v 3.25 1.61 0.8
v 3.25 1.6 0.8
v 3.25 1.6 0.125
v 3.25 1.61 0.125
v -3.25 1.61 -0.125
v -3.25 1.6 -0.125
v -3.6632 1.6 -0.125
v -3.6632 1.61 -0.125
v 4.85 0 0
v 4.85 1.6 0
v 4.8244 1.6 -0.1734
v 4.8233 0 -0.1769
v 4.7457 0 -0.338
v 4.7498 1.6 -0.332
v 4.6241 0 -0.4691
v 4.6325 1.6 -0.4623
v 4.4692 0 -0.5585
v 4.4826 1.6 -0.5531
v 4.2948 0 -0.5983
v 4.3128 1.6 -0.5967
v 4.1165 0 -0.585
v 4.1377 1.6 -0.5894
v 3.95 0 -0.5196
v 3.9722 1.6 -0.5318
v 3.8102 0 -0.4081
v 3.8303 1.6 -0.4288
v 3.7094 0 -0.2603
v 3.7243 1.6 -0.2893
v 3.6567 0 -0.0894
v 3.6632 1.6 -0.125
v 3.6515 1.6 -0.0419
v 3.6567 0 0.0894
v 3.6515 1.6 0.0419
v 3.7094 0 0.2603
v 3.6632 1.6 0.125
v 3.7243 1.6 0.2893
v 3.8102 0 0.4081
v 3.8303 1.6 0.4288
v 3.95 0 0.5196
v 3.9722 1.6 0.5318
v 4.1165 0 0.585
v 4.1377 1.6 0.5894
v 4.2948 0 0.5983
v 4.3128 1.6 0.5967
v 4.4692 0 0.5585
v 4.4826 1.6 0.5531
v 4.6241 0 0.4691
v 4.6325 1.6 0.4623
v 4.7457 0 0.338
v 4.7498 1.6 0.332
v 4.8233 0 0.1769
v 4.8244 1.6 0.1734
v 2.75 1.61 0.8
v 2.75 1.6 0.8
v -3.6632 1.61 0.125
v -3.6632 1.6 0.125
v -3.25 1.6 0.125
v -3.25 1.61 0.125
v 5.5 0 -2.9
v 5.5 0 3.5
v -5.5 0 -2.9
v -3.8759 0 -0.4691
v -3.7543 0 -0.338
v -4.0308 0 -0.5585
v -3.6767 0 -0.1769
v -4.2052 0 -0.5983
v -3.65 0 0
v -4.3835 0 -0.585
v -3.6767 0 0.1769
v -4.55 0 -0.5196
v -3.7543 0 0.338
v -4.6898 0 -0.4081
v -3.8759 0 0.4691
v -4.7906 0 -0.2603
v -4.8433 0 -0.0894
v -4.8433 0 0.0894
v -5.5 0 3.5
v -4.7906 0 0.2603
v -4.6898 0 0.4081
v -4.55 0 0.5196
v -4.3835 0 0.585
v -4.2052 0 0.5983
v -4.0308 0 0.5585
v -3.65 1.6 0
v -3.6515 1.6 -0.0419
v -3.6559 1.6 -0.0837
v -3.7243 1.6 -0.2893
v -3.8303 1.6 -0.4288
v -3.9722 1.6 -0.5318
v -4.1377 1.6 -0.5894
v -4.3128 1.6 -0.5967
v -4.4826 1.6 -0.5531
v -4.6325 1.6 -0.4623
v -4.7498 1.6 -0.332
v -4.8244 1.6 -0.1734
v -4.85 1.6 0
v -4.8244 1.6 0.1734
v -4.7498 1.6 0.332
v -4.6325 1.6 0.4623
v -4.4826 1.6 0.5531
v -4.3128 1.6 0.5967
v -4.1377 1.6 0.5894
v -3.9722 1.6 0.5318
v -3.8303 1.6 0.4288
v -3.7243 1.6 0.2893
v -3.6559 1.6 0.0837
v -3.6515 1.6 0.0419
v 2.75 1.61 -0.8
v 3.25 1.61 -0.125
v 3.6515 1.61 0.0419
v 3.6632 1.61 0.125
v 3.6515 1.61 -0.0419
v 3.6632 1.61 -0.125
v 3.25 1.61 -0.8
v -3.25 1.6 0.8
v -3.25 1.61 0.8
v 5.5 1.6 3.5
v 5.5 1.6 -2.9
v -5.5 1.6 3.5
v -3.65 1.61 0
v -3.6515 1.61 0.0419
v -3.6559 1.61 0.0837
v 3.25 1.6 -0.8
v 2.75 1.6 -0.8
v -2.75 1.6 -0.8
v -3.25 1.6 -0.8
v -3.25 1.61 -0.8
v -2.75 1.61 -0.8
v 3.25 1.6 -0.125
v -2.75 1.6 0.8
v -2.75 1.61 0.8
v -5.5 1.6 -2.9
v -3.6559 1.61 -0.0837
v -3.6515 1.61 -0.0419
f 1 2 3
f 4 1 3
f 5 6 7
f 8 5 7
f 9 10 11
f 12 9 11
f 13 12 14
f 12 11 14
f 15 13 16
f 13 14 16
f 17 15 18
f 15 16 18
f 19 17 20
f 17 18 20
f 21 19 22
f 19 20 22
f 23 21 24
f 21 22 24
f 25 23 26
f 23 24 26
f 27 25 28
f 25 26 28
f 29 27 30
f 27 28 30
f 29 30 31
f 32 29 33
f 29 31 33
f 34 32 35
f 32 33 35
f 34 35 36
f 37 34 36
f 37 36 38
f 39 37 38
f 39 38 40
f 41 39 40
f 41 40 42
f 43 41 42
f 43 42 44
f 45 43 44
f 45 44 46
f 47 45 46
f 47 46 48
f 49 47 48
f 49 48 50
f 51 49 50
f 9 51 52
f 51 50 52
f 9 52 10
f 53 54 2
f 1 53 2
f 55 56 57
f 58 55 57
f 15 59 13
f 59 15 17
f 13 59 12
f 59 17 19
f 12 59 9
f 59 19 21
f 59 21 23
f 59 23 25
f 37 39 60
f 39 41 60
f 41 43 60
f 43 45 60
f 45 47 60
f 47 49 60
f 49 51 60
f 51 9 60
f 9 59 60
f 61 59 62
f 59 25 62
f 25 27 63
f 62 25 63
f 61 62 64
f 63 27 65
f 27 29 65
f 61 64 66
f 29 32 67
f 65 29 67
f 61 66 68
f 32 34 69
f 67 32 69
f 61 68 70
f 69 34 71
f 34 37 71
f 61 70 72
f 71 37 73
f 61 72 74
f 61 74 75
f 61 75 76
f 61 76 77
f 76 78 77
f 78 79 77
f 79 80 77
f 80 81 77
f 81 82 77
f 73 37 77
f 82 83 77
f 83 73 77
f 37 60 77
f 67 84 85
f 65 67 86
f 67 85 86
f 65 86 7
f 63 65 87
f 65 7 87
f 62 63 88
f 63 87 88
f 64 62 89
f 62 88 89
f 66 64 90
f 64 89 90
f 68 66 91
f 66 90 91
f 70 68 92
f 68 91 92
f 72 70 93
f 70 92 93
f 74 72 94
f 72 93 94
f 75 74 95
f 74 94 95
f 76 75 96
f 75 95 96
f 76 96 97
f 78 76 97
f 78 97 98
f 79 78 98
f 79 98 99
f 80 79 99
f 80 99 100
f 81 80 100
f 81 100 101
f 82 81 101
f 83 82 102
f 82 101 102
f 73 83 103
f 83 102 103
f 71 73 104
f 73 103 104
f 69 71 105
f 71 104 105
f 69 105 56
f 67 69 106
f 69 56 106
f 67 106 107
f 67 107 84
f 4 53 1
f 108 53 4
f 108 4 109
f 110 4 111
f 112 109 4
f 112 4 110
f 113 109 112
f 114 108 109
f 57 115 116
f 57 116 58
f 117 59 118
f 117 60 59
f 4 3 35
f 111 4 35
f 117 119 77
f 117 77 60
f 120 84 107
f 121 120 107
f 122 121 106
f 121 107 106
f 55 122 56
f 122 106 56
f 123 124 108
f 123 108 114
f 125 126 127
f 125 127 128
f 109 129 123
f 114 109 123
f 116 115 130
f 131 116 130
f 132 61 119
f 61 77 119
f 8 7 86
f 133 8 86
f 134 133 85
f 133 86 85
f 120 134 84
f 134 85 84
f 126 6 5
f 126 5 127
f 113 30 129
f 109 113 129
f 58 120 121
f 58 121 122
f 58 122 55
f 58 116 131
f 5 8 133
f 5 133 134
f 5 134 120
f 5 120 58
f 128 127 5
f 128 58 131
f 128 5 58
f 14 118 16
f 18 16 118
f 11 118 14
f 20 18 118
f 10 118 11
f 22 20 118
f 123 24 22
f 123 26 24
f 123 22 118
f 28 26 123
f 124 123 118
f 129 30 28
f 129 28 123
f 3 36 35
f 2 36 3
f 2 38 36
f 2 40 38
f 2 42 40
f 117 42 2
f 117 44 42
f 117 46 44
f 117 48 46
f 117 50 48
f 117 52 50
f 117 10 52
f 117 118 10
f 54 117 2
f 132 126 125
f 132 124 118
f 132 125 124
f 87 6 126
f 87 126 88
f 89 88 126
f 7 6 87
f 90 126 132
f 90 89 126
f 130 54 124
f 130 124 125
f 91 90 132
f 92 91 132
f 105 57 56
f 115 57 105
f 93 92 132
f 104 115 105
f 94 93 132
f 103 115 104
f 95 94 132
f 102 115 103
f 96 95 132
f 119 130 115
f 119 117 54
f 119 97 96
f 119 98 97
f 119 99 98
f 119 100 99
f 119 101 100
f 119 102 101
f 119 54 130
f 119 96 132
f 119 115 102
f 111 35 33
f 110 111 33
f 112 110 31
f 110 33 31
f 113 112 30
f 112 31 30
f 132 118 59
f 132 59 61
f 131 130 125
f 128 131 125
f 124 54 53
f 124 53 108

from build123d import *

# Parameters (mm, degrees)
SKETCH1_W           = 11
SKETCH1_H           = 4
BOSS_EXTRUDE1_DEPTH = 1.6
SKETCH3_R           = 0.6
CUT_EXTRUDE1_DEPTH  = 1.6
SKETCH2_W           = 0.5
SKETCH2_H           = 1.6
BOSS_EXTRUDE2_DEPTH = 0.01
BOSS_EXTRUDE3_DEPTH = 0.01
SKETCH5_W           = 11
SKETCH5_H           = 1.6
BOSS_EXTRUDE4_DEPTH = 1.5
SKETCH6_W           = 11
SKETCH6_H           = 1.6
BOSS_EXTRUDE5_DEPTH = 0.9


with BuildPart() as part:
    # Sketch1 → Boss-Extrude1 (new body)
    with BuildSketch(Plane(origin=(0, 0, 0), x_dir=(1, 0, 0), z_dir=(0, 1, 0))):
        Rectangle(SKETCH1_W, SKETCH1_H)
    extrude(amount=BOSS_EXTRUDE1_DEPTH)

    # Sketch3 → Cut-Extrude1 (cut)
    with BuildSketch(Plane(origin=(0, 1.6, 0), x_dir=(1, 0, 0), z_dir=(0, 1, 0))):
        with Locations((4.25, 0)):
            Circle(SKETCH3_R)
        with Locations((-4.25, 0)):
            Circle(SKETCH3_R)
    extrude(amount=-CUT_EXTRUDE1_DEPTH, mode=Mode.SUBTRACT)

    # Sketch2 → Boss-Extrude2 (add)
    with BuildSketch(Plane(origin=(0, 1.6, 0), x_dir=(1, 0, 0), z_dir=(0, 1, 0))):
        with Locations((-3, 0)):
            Rectangle(SKETCH2_W, SKETCH2_H)
        with Locations((3, 0)):
            Rectangle(SKETCH2_W, SKETCH2_H)
    extrude(amount=BOSS_EXTRUDE2_DEPTH)

    # Sketch4 → Boss-Extrude3 (add)
    with BuildSketch(Plane(origin=(0, 1.6, 0), x_dir=(1, 0, 0), z_dir=(0, 1, 0))):
        with BuildLine():
            Line((3.25, -0.125), (3.663165, -0.125))
            ThreePointArc((3.663165, -0.125), (3.65, 0), (3.663165, 0.125))
            Line((3.663165, 0.125), (3.25, 0.125))
            Line((3.25, 0.125), (3.25, -0.125))
        make_face()
        with BuildLine():
            Line((-3.25, 0.125), (-3.663165, 0.125))
            ThreePointArc((-3.663165, 0.125), (-3.6533, 0.062846), (-3.65, 0))
            ThreePointArc((-3.65, 0), (-3.6533, -0.062846), (-3.663165, -0.125))
            Line((-3.663165, -0.125), (-3.25, -0.125))
            Line((-3.25, -0.125), (-3.25, 0.125))
        make_face()
    extrude(amount=BOSS_EXTRUDE3_DEPTH)

    # Sketch5 → Boss-Extrude4 (add)
    with BuildSketch(Plane.XY.offset(2)):
        with Locations((0, 0.8)):
            Rectangle(SKETCH5_W, SKETCH5_H)
    extrude(amount=BOSS_EXTRUDE4_DEPTH)

    # Sketch6 → Boss-Extrude5 (add)
    with BuildSketch(Plane(origin=(0, 0, -2), x_dir=(-1, 0, 0), z_dir=(0, 0, -1))):
        with Locations((0, 0.8)):
            Rectangle(SKETCH6_W, SKETCH6_H)
    extrude(amount=BOSS_EXTRUDE5_DEPTH)


solid = part.part
